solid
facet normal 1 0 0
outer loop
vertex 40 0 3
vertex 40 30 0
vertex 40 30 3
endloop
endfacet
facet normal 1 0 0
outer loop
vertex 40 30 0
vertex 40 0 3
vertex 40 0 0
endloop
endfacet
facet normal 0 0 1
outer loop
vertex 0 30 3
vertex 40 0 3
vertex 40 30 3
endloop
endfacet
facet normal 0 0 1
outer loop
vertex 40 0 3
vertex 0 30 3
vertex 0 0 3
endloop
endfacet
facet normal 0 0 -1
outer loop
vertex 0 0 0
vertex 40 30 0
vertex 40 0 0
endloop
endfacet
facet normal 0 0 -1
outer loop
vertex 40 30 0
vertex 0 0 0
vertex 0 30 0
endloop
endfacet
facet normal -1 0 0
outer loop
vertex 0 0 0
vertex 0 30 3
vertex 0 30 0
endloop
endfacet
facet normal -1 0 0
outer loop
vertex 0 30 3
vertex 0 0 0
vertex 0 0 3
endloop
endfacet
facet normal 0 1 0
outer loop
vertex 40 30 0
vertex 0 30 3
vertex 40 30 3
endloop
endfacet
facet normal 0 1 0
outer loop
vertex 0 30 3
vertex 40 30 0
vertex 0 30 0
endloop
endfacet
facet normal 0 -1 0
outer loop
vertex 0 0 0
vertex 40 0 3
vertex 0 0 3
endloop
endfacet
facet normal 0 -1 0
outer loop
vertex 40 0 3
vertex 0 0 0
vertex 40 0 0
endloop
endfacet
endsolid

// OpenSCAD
 translate([0,20,0]) color([1,1,1]) cube([40,10,3]);
 translate([0,10,0]) color([0,0,1]) cube([40,10,3]);
 color([1,0,0]) cube([40,10,3]);
